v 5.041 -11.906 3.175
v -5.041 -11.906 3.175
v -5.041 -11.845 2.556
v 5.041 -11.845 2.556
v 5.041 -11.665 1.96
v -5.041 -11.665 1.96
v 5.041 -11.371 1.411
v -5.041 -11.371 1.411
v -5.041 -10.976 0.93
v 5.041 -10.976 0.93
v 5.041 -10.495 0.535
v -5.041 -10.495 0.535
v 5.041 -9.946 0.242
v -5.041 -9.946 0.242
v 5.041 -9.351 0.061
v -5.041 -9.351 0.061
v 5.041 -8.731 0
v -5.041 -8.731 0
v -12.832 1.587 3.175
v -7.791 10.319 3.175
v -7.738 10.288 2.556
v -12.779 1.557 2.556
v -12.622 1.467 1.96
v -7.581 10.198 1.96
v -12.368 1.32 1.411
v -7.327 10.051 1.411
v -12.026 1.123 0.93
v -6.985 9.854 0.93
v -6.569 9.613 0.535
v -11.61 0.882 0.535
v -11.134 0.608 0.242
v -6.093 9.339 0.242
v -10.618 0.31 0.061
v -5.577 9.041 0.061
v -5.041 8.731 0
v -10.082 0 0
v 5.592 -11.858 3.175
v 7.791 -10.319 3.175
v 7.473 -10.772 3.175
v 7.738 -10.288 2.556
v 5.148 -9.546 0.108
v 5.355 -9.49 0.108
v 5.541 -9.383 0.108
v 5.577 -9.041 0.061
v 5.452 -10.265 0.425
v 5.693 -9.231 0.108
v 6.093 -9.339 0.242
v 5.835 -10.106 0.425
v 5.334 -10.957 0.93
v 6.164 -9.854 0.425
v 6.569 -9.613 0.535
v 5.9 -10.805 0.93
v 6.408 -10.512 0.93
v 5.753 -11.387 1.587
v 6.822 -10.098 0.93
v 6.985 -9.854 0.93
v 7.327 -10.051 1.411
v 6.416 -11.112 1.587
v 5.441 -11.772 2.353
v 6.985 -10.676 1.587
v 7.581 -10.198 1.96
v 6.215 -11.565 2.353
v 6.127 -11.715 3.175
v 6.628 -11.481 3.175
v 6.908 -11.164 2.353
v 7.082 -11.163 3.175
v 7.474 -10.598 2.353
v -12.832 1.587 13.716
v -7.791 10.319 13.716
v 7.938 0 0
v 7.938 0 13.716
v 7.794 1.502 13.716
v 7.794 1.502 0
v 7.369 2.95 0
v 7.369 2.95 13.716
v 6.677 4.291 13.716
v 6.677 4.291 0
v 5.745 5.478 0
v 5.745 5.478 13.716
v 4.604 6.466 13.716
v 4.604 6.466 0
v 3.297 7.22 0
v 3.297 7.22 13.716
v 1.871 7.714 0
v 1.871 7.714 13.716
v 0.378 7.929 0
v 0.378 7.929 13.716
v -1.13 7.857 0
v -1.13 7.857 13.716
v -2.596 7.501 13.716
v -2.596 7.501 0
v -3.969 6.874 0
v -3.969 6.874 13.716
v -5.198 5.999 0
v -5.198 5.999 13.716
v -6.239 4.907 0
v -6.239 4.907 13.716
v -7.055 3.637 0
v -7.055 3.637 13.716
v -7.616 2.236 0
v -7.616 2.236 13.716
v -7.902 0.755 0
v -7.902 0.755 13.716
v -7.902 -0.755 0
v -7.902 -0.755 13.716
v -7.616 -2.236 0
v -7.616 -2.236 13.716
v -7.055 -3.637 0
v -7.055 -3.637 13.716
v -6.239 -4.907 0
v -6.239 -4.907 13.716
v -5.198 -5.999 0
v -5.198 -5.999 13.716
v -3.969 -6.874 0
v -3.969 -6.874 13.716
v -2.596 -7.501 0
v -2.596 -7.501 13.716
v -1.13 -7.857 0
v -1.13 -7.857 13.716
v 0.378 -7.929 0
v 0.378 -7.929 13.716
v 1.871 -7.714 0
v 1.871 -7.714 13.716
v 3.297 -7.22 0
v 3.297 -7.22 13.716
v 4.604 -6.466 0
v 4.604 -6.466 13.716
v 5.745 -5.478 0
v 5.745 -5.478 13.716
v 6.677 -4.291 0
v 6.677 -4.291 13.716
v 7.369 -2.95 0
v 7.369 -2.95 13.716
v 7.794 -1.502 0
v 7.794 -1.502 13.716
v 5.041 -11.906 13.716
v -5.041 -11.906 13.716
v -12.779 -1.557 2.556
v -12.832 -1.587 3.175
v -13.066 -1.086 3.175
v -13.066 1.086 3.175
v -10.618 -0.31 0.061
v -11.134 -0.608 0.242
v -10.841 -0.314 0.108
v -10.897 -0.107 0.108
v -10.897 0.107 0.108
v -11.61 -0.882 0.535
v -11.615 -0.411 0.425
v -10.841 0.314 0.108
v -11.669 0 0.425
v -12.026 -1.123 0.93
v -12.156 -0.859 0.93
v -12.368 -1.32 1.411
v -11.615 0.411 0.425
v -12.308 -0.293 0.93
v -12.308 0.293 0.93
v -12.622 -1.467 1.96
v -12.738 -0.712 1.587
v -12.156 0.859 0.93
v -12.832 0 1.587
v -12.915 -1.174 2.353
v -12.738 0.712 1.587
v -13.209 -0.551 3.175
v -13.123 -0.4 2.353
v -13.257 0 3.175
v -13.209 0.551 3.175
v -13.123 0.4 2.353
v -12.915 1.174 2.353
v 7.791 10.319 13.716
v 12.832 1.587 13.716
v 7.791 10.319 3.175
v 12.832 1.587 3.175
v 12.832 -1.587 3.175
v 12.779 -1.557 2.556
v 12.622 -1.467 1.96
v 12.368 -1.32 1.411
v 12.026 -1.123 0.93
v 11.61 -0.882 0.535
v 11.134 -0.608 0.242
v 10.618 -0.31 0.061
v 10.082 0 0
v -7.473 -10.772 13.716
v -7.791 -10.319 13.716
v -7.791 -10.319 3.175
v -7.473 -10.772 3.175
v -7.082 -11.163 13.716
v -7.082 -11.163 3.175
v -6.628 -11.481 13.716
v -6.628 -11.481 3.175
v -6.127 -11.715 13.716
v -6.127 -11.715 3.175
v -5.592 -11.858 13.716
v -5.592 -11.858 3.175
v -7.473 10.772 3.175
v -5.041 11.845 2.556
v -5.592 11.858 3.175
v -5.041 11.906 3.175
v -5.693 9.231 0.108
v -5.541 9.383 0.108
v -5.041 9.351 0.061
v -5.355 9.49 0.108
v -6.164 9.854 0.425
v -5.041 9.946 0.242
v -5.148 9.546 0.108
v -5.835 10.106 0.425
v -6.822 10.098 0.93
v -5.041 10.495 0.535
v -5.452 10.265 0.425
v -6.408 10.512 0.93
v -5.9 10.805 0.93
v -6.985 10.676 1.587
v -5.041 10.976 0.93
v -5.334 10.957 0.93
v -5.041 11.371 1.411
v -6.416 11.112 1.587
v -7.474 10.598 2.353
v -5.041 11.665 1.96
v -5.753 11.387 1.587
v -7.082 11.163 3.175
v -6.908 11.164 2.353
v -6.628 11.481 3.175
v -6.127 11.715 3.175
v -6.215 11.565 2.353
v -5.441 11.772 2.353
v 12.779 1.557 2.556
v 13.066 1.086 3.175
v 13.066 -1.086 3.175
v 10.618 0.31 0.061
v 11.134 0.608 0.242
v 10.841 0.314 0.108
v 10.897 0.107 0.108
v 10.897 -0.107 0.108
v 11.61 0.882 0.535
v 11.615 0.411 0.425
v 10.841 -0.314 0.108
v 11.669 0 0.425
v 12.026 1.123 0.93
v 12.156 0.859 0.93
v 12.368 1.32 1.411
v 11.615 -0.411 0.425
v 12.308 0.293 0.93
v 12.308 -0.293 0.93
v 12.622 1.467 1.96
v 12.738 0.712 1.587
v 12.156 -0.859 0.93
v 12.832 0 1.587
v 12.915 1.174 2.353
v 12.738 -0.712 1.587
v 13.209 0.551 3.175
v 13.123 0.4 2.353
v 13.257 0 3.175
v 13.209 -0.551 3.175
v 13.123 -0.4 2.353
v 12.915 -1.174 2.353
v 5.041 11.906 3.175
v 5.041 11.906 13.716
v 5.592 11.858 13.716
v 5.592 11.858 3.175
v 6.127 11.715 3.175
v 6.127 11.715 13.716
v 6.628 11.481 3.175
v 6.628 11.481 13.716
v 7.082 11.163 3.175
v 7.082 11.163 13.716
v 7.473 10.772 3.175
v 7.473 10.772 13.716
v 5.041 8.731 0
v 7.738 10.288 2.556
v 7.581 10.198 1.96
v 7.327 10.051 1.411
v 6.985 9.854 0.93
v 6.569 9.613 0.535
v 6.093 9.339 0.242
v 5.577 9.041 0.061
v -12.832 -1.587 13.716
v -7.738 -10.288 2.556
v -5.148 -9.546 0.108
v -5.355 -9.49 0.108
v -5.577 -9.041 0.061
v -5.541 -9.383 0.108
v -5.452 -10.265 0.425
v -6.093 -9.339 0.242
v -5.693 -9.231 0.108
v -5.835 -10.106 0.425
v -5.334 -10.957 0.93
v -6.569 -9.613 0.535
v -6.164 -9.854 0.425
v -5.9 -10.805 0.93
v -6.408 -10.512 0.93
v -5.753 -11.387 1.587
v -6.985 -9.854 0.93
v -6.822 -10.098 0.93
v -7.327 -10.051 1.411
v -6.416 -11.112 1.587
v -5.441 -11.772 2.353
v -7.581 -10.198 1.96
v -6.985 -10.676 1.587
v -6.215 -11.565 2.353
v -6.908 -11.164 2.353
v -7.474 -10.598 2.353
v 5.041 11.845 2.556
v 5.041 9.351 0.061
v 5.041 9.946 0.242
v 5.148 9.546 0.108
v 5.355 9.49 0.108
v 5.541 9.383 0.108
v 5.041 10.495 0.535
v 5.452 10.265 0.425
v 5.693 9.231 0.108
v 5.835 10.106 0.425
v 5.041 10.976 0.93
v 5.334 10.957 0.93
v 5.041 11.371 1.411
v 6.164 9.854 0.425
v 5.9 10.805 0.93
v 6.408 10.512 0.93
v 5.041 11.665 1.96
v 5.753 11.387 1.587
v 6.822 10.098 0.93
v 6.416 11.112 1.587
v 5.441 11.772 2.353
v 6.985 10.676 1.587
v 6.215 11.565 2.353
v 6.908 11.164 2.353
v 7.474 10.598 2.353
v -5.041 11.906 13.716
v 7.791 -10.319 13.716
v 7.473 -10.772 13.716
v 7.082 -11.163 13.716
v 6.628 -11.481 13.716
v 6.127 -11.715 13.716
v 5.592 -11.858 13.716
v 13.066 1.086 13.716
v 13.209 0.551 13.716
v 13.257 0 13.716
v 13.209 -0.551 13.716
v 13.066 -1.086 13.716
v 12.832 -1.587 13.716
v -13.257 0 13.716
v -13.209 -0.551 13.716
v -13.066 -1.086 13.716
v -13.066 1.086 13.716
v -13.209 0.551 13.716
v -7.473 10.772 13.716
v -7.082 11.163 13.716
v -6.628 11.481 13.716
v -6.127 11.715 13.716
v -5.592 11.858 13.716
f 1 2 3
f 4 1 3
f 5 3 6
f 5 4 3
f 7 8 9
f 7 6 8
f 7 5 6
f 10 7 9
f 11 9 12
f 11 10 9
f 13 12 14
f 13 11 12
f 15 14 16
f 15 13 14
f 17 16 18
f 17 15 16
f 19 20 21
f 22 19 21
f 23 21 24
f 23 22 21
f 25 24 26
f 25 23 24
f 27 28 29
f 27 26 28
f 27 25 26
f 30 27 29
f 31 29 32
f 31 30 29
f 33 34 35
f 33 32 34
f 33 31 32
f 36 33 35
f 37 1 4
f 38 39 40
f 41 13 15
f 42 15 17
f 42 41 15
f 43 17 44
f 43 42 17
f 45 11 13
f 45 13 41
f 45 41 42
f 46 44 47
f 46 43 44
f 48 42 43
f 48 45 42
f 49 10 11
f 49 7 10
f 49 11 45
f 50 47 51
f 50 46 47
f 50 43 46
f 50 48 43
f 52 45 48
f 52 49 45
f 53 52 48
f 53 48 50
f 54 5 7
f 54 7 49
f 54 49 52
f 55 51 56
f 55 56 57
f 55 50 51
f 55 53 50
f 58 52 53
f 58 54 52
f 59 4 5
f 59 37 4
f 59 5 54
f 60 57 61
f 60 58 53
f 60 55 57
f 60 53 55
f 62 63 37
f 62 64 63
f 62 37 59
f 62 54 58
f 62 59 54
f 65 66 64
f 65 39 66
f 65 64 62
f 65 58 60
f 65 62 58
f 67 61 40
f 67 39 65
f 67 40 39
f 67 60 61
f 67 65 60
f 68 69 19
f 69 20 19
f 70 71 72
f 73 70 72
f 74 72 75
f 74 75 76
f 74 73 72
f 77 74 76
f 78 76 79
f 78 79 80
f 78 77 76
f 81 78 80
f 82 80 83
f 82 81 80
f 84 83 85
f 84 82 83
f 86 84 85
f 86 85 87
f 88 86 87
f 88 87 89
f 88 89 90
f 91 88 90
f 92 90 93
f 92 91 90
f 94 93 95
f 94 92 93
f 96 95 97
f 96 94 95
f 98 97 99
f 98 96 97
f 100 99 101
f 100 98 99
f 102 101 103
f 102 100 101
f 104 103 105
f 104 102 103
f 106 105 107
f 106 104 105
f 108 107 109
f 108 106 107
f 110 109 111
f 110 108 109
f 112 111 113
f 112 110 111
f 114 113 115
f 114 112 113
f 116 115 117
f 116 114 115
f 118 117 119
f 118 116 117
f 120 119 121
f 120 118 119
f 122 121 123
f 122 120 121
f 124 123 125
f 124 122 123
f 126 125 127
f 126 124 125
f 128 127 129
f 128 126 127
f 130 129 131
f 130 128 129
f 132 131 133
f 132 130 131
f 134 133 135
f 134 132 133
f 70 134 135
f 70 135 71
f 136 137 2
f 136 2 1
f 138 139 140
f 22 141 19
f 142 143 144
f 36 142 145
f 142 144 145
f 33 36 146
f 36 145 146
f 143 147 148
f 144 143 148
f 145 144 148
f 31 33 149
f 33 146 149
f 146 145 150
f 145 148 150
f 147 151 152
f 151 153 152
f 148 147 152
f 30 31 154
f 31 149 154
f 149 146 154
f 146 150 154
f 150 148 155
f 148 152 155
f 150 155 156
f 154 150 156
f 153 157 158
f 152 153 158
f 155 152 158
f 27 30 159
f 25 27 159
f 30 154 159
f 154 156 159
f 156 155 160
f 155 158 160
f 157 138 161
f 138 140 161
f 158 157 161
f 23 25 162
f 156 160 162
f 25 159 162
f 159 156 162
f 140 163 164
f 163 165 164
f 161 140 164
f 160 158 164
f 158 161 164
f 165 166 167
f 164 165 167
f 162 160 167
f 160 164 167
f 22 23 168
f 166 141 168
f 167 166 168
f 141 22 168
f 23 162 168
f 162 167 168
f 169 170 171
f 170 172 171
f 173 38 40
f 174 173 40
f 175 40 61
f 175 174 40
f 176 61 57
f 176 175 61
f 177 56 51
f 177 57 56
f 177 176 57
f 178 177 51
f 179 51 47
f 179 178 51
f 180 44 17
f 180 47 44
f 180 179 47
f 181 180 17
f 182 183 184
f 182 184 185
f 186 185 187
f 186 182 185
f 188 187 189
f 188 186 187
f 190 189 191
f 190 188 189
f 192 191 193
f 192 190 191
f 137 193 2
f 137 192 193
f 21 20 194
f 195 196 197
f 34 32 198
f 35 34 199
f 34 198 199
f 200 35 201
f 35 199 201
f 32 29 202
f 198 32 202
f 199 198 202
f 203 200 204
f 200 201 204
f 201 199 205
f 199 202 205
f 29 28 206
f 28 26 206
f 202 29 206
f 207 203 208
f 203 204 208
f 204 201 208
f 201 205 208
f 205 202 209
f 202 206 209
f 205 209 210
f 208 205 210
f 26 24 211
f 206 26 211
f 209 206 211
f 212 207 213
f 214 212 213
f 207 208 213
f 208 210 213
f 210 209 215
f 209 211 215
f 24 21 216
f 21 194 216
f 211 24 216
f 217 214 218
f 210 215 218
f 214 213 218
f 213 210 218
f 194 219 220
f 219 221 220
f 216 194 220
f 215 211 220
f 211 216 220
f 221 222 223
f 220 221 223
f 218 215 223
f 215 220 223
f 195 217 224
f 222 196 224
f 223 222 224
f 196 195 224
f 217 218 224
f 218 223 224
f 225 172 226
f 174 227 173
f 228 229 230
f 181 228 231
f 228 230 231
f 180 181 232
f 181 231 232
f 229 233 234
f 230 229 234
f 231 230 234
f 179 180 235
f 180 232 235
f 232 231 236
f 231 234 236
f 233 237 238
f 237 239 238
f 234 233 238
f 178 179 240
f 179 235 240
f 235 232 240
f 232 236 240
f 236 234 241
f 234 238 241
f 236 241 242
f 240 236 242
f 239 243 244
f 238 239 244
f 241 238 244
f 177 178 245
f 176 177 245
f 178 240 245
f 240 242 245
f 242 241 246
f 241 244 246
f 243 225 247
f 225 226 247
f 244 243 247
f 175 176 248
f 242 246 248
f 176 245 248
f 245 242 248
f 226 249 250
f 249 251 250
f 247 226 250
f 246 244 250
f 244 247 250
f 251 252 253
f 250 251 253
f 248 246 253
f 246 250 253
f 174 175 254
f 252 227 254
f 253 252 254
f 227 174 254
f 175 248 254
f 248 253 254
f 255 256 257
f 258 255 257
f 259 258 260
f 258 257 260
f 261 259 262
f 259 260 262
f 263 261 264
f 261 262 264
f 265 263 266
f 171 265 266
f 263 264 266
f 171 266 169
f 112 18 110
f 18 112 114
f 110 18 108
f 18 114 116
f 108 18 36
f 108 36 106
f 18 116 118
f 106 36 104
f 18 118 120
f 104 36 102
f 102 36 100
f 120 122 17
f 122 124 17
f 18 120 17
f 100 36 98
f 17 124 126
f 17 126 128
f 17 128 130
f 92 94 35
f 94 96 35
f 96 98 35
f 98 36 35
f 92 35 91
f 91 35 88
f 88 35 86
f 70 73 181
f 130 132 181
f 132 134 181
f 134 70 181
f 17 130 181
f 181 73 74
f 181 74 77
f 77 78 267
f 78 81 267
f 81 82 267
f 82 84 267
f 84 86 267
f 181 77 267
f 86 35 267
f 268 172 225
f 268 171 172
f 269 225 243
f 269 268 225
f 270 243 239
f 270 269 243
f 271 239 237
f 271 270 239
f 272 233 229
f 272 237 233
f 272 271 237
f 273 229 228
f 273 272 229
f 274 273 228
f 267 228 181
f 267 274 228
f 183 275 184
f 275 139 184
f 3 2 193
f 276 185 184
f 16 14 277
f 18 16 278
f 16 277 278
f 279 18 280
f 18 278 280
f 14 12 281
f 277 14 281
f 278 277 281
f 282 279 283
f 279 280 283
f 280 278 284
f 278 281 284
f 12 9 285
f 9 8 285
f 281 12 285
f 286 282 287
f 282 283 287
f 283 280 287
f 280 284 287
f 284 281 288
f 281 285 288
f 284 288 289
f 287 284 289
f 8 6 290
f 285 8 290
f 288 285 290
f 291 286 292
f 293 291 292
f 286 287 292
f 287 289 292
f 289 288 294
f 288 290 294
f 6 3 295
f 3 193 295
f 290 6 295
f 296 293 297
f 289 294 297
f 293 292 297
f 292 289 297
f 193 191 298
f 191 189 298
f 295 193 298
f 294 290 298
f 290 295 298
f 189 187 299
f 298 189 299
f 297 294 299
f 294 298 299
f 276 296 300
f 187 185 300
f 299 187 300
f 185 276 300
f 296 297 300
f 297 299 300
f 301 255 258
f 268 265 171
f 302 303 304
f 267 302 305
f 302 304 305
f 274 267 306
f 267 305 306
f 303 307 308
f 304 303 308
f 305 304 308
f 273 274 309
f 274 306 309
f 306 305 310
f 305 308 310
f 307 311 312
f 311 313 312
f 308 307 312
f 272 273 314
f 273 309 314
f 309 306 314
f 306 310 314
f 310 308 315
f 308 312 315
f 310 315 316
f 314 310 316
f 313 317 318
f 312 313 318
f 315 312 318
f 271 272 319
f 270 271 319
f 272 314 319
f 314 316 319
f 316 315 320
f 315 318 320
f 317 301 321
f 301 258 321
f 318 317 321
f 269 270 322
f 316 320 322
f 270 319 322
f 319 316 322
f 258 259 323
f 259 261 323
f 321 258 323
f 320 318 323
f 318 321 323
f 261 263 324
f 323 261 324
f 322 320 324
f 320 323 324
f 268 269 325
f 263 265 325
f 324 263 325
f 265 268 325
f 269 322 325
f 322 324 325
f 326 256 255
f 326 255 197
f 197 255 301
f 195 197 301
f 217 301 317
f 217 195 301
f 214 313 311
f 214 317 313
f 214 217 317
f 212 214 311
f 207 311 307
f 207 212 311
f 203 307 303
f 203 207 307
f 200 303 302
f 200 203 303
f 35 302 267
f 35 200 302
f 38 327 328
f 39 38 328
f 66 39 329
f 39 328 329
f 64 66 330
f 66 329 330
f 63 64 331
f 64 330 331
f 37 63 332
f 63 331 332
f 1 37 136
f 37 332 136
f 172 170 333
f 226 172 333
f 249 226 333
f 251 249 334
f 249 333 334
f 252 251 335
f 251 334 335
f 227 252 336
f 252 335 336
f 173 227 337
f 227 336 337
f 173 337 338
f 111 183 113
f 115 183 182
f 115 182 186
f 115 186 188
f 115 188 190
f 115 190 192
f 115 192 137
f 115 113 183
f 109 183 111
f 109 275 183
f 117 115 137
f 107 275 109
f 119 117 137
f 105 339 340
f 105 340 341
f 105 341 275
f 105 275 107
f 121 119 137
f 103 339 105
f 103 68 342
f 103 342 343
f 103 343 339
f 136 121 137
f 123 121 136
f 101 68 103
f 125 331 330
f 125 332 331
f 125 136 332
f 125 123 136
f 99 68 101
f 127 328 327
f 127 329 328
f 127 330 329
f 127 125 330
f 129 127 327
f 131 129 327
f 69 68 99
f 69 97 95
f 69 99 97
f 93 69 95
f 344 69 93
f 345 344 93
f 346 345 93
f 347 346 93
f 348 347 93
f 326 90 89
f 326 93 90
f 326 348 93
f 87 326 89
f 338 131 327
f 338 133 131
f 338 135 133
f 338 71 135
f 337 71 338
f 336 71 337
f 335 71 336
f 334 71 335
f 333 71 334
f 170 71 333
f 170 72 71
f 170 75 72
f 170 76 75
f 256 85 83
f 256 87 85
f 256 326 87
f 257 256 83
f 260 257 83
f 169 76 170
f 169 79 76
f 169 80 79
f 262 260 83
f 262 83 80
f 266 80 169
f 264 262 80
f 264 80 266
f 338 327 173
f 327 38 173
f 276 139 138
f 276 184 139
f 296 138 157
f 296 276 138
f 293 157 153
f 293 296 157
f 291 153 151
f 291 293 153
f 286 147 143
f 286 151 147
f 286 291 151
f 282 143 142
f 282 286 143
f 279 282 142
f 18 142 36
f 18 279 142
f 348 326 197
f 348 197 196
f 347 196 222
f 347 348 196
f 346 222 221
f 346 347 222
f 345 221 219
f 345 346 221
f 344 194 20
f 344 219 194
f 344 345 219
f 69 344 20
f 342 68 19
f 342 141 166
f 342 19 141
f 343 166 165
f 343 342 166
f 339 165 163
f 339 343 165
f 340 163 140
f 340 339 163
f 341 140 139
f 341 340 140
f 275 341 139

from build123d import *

# Parameters (mm, degrees)
F0_R     = 7.9375
F1_DEPTH = 13.716
F2_R     = 3.175


with BuildPart() as f1:
    # F0 (on Top) → F1 (new body)
    with BuildSketch(Plane.XY):
        Polygon((6.874077, 11.90625), (-6.874077, 11.90625), (-13.748153, 0), (-6.874077, -11.90625), (6.874077, -11.90625), (13.748153, 0), align=None)
        Circle(F0_R, mode=Mode.SUBTRACT)
    extrude(amount=F1_DEPTH)

    # F2
    f2_edges = [f1.edges().sort_by_distance(p)[0] for p in [
        (-13.748153, 0, 6.858),
        (10.311115, -5.953125, 0),
        (13.748153, 0, 6.858),
        (6.874077, -11.90625, 6.858),
        (-6.874077, -11.90625, 6.858),
        (6.874077, 11.90625, 6.858),
        (-6.874077, 11.90625, 6.858),
        (0, -11.90625, 0),
        (-10.311115, -5.953125, 0),
        (-10.311115, 5.953125, 0),
        (0, 11.90625, 0),
        (10.311115, 5.953125, 0),
    ]]
    fillet(f2_edges, radius=F2_R)


solid = f1.part
